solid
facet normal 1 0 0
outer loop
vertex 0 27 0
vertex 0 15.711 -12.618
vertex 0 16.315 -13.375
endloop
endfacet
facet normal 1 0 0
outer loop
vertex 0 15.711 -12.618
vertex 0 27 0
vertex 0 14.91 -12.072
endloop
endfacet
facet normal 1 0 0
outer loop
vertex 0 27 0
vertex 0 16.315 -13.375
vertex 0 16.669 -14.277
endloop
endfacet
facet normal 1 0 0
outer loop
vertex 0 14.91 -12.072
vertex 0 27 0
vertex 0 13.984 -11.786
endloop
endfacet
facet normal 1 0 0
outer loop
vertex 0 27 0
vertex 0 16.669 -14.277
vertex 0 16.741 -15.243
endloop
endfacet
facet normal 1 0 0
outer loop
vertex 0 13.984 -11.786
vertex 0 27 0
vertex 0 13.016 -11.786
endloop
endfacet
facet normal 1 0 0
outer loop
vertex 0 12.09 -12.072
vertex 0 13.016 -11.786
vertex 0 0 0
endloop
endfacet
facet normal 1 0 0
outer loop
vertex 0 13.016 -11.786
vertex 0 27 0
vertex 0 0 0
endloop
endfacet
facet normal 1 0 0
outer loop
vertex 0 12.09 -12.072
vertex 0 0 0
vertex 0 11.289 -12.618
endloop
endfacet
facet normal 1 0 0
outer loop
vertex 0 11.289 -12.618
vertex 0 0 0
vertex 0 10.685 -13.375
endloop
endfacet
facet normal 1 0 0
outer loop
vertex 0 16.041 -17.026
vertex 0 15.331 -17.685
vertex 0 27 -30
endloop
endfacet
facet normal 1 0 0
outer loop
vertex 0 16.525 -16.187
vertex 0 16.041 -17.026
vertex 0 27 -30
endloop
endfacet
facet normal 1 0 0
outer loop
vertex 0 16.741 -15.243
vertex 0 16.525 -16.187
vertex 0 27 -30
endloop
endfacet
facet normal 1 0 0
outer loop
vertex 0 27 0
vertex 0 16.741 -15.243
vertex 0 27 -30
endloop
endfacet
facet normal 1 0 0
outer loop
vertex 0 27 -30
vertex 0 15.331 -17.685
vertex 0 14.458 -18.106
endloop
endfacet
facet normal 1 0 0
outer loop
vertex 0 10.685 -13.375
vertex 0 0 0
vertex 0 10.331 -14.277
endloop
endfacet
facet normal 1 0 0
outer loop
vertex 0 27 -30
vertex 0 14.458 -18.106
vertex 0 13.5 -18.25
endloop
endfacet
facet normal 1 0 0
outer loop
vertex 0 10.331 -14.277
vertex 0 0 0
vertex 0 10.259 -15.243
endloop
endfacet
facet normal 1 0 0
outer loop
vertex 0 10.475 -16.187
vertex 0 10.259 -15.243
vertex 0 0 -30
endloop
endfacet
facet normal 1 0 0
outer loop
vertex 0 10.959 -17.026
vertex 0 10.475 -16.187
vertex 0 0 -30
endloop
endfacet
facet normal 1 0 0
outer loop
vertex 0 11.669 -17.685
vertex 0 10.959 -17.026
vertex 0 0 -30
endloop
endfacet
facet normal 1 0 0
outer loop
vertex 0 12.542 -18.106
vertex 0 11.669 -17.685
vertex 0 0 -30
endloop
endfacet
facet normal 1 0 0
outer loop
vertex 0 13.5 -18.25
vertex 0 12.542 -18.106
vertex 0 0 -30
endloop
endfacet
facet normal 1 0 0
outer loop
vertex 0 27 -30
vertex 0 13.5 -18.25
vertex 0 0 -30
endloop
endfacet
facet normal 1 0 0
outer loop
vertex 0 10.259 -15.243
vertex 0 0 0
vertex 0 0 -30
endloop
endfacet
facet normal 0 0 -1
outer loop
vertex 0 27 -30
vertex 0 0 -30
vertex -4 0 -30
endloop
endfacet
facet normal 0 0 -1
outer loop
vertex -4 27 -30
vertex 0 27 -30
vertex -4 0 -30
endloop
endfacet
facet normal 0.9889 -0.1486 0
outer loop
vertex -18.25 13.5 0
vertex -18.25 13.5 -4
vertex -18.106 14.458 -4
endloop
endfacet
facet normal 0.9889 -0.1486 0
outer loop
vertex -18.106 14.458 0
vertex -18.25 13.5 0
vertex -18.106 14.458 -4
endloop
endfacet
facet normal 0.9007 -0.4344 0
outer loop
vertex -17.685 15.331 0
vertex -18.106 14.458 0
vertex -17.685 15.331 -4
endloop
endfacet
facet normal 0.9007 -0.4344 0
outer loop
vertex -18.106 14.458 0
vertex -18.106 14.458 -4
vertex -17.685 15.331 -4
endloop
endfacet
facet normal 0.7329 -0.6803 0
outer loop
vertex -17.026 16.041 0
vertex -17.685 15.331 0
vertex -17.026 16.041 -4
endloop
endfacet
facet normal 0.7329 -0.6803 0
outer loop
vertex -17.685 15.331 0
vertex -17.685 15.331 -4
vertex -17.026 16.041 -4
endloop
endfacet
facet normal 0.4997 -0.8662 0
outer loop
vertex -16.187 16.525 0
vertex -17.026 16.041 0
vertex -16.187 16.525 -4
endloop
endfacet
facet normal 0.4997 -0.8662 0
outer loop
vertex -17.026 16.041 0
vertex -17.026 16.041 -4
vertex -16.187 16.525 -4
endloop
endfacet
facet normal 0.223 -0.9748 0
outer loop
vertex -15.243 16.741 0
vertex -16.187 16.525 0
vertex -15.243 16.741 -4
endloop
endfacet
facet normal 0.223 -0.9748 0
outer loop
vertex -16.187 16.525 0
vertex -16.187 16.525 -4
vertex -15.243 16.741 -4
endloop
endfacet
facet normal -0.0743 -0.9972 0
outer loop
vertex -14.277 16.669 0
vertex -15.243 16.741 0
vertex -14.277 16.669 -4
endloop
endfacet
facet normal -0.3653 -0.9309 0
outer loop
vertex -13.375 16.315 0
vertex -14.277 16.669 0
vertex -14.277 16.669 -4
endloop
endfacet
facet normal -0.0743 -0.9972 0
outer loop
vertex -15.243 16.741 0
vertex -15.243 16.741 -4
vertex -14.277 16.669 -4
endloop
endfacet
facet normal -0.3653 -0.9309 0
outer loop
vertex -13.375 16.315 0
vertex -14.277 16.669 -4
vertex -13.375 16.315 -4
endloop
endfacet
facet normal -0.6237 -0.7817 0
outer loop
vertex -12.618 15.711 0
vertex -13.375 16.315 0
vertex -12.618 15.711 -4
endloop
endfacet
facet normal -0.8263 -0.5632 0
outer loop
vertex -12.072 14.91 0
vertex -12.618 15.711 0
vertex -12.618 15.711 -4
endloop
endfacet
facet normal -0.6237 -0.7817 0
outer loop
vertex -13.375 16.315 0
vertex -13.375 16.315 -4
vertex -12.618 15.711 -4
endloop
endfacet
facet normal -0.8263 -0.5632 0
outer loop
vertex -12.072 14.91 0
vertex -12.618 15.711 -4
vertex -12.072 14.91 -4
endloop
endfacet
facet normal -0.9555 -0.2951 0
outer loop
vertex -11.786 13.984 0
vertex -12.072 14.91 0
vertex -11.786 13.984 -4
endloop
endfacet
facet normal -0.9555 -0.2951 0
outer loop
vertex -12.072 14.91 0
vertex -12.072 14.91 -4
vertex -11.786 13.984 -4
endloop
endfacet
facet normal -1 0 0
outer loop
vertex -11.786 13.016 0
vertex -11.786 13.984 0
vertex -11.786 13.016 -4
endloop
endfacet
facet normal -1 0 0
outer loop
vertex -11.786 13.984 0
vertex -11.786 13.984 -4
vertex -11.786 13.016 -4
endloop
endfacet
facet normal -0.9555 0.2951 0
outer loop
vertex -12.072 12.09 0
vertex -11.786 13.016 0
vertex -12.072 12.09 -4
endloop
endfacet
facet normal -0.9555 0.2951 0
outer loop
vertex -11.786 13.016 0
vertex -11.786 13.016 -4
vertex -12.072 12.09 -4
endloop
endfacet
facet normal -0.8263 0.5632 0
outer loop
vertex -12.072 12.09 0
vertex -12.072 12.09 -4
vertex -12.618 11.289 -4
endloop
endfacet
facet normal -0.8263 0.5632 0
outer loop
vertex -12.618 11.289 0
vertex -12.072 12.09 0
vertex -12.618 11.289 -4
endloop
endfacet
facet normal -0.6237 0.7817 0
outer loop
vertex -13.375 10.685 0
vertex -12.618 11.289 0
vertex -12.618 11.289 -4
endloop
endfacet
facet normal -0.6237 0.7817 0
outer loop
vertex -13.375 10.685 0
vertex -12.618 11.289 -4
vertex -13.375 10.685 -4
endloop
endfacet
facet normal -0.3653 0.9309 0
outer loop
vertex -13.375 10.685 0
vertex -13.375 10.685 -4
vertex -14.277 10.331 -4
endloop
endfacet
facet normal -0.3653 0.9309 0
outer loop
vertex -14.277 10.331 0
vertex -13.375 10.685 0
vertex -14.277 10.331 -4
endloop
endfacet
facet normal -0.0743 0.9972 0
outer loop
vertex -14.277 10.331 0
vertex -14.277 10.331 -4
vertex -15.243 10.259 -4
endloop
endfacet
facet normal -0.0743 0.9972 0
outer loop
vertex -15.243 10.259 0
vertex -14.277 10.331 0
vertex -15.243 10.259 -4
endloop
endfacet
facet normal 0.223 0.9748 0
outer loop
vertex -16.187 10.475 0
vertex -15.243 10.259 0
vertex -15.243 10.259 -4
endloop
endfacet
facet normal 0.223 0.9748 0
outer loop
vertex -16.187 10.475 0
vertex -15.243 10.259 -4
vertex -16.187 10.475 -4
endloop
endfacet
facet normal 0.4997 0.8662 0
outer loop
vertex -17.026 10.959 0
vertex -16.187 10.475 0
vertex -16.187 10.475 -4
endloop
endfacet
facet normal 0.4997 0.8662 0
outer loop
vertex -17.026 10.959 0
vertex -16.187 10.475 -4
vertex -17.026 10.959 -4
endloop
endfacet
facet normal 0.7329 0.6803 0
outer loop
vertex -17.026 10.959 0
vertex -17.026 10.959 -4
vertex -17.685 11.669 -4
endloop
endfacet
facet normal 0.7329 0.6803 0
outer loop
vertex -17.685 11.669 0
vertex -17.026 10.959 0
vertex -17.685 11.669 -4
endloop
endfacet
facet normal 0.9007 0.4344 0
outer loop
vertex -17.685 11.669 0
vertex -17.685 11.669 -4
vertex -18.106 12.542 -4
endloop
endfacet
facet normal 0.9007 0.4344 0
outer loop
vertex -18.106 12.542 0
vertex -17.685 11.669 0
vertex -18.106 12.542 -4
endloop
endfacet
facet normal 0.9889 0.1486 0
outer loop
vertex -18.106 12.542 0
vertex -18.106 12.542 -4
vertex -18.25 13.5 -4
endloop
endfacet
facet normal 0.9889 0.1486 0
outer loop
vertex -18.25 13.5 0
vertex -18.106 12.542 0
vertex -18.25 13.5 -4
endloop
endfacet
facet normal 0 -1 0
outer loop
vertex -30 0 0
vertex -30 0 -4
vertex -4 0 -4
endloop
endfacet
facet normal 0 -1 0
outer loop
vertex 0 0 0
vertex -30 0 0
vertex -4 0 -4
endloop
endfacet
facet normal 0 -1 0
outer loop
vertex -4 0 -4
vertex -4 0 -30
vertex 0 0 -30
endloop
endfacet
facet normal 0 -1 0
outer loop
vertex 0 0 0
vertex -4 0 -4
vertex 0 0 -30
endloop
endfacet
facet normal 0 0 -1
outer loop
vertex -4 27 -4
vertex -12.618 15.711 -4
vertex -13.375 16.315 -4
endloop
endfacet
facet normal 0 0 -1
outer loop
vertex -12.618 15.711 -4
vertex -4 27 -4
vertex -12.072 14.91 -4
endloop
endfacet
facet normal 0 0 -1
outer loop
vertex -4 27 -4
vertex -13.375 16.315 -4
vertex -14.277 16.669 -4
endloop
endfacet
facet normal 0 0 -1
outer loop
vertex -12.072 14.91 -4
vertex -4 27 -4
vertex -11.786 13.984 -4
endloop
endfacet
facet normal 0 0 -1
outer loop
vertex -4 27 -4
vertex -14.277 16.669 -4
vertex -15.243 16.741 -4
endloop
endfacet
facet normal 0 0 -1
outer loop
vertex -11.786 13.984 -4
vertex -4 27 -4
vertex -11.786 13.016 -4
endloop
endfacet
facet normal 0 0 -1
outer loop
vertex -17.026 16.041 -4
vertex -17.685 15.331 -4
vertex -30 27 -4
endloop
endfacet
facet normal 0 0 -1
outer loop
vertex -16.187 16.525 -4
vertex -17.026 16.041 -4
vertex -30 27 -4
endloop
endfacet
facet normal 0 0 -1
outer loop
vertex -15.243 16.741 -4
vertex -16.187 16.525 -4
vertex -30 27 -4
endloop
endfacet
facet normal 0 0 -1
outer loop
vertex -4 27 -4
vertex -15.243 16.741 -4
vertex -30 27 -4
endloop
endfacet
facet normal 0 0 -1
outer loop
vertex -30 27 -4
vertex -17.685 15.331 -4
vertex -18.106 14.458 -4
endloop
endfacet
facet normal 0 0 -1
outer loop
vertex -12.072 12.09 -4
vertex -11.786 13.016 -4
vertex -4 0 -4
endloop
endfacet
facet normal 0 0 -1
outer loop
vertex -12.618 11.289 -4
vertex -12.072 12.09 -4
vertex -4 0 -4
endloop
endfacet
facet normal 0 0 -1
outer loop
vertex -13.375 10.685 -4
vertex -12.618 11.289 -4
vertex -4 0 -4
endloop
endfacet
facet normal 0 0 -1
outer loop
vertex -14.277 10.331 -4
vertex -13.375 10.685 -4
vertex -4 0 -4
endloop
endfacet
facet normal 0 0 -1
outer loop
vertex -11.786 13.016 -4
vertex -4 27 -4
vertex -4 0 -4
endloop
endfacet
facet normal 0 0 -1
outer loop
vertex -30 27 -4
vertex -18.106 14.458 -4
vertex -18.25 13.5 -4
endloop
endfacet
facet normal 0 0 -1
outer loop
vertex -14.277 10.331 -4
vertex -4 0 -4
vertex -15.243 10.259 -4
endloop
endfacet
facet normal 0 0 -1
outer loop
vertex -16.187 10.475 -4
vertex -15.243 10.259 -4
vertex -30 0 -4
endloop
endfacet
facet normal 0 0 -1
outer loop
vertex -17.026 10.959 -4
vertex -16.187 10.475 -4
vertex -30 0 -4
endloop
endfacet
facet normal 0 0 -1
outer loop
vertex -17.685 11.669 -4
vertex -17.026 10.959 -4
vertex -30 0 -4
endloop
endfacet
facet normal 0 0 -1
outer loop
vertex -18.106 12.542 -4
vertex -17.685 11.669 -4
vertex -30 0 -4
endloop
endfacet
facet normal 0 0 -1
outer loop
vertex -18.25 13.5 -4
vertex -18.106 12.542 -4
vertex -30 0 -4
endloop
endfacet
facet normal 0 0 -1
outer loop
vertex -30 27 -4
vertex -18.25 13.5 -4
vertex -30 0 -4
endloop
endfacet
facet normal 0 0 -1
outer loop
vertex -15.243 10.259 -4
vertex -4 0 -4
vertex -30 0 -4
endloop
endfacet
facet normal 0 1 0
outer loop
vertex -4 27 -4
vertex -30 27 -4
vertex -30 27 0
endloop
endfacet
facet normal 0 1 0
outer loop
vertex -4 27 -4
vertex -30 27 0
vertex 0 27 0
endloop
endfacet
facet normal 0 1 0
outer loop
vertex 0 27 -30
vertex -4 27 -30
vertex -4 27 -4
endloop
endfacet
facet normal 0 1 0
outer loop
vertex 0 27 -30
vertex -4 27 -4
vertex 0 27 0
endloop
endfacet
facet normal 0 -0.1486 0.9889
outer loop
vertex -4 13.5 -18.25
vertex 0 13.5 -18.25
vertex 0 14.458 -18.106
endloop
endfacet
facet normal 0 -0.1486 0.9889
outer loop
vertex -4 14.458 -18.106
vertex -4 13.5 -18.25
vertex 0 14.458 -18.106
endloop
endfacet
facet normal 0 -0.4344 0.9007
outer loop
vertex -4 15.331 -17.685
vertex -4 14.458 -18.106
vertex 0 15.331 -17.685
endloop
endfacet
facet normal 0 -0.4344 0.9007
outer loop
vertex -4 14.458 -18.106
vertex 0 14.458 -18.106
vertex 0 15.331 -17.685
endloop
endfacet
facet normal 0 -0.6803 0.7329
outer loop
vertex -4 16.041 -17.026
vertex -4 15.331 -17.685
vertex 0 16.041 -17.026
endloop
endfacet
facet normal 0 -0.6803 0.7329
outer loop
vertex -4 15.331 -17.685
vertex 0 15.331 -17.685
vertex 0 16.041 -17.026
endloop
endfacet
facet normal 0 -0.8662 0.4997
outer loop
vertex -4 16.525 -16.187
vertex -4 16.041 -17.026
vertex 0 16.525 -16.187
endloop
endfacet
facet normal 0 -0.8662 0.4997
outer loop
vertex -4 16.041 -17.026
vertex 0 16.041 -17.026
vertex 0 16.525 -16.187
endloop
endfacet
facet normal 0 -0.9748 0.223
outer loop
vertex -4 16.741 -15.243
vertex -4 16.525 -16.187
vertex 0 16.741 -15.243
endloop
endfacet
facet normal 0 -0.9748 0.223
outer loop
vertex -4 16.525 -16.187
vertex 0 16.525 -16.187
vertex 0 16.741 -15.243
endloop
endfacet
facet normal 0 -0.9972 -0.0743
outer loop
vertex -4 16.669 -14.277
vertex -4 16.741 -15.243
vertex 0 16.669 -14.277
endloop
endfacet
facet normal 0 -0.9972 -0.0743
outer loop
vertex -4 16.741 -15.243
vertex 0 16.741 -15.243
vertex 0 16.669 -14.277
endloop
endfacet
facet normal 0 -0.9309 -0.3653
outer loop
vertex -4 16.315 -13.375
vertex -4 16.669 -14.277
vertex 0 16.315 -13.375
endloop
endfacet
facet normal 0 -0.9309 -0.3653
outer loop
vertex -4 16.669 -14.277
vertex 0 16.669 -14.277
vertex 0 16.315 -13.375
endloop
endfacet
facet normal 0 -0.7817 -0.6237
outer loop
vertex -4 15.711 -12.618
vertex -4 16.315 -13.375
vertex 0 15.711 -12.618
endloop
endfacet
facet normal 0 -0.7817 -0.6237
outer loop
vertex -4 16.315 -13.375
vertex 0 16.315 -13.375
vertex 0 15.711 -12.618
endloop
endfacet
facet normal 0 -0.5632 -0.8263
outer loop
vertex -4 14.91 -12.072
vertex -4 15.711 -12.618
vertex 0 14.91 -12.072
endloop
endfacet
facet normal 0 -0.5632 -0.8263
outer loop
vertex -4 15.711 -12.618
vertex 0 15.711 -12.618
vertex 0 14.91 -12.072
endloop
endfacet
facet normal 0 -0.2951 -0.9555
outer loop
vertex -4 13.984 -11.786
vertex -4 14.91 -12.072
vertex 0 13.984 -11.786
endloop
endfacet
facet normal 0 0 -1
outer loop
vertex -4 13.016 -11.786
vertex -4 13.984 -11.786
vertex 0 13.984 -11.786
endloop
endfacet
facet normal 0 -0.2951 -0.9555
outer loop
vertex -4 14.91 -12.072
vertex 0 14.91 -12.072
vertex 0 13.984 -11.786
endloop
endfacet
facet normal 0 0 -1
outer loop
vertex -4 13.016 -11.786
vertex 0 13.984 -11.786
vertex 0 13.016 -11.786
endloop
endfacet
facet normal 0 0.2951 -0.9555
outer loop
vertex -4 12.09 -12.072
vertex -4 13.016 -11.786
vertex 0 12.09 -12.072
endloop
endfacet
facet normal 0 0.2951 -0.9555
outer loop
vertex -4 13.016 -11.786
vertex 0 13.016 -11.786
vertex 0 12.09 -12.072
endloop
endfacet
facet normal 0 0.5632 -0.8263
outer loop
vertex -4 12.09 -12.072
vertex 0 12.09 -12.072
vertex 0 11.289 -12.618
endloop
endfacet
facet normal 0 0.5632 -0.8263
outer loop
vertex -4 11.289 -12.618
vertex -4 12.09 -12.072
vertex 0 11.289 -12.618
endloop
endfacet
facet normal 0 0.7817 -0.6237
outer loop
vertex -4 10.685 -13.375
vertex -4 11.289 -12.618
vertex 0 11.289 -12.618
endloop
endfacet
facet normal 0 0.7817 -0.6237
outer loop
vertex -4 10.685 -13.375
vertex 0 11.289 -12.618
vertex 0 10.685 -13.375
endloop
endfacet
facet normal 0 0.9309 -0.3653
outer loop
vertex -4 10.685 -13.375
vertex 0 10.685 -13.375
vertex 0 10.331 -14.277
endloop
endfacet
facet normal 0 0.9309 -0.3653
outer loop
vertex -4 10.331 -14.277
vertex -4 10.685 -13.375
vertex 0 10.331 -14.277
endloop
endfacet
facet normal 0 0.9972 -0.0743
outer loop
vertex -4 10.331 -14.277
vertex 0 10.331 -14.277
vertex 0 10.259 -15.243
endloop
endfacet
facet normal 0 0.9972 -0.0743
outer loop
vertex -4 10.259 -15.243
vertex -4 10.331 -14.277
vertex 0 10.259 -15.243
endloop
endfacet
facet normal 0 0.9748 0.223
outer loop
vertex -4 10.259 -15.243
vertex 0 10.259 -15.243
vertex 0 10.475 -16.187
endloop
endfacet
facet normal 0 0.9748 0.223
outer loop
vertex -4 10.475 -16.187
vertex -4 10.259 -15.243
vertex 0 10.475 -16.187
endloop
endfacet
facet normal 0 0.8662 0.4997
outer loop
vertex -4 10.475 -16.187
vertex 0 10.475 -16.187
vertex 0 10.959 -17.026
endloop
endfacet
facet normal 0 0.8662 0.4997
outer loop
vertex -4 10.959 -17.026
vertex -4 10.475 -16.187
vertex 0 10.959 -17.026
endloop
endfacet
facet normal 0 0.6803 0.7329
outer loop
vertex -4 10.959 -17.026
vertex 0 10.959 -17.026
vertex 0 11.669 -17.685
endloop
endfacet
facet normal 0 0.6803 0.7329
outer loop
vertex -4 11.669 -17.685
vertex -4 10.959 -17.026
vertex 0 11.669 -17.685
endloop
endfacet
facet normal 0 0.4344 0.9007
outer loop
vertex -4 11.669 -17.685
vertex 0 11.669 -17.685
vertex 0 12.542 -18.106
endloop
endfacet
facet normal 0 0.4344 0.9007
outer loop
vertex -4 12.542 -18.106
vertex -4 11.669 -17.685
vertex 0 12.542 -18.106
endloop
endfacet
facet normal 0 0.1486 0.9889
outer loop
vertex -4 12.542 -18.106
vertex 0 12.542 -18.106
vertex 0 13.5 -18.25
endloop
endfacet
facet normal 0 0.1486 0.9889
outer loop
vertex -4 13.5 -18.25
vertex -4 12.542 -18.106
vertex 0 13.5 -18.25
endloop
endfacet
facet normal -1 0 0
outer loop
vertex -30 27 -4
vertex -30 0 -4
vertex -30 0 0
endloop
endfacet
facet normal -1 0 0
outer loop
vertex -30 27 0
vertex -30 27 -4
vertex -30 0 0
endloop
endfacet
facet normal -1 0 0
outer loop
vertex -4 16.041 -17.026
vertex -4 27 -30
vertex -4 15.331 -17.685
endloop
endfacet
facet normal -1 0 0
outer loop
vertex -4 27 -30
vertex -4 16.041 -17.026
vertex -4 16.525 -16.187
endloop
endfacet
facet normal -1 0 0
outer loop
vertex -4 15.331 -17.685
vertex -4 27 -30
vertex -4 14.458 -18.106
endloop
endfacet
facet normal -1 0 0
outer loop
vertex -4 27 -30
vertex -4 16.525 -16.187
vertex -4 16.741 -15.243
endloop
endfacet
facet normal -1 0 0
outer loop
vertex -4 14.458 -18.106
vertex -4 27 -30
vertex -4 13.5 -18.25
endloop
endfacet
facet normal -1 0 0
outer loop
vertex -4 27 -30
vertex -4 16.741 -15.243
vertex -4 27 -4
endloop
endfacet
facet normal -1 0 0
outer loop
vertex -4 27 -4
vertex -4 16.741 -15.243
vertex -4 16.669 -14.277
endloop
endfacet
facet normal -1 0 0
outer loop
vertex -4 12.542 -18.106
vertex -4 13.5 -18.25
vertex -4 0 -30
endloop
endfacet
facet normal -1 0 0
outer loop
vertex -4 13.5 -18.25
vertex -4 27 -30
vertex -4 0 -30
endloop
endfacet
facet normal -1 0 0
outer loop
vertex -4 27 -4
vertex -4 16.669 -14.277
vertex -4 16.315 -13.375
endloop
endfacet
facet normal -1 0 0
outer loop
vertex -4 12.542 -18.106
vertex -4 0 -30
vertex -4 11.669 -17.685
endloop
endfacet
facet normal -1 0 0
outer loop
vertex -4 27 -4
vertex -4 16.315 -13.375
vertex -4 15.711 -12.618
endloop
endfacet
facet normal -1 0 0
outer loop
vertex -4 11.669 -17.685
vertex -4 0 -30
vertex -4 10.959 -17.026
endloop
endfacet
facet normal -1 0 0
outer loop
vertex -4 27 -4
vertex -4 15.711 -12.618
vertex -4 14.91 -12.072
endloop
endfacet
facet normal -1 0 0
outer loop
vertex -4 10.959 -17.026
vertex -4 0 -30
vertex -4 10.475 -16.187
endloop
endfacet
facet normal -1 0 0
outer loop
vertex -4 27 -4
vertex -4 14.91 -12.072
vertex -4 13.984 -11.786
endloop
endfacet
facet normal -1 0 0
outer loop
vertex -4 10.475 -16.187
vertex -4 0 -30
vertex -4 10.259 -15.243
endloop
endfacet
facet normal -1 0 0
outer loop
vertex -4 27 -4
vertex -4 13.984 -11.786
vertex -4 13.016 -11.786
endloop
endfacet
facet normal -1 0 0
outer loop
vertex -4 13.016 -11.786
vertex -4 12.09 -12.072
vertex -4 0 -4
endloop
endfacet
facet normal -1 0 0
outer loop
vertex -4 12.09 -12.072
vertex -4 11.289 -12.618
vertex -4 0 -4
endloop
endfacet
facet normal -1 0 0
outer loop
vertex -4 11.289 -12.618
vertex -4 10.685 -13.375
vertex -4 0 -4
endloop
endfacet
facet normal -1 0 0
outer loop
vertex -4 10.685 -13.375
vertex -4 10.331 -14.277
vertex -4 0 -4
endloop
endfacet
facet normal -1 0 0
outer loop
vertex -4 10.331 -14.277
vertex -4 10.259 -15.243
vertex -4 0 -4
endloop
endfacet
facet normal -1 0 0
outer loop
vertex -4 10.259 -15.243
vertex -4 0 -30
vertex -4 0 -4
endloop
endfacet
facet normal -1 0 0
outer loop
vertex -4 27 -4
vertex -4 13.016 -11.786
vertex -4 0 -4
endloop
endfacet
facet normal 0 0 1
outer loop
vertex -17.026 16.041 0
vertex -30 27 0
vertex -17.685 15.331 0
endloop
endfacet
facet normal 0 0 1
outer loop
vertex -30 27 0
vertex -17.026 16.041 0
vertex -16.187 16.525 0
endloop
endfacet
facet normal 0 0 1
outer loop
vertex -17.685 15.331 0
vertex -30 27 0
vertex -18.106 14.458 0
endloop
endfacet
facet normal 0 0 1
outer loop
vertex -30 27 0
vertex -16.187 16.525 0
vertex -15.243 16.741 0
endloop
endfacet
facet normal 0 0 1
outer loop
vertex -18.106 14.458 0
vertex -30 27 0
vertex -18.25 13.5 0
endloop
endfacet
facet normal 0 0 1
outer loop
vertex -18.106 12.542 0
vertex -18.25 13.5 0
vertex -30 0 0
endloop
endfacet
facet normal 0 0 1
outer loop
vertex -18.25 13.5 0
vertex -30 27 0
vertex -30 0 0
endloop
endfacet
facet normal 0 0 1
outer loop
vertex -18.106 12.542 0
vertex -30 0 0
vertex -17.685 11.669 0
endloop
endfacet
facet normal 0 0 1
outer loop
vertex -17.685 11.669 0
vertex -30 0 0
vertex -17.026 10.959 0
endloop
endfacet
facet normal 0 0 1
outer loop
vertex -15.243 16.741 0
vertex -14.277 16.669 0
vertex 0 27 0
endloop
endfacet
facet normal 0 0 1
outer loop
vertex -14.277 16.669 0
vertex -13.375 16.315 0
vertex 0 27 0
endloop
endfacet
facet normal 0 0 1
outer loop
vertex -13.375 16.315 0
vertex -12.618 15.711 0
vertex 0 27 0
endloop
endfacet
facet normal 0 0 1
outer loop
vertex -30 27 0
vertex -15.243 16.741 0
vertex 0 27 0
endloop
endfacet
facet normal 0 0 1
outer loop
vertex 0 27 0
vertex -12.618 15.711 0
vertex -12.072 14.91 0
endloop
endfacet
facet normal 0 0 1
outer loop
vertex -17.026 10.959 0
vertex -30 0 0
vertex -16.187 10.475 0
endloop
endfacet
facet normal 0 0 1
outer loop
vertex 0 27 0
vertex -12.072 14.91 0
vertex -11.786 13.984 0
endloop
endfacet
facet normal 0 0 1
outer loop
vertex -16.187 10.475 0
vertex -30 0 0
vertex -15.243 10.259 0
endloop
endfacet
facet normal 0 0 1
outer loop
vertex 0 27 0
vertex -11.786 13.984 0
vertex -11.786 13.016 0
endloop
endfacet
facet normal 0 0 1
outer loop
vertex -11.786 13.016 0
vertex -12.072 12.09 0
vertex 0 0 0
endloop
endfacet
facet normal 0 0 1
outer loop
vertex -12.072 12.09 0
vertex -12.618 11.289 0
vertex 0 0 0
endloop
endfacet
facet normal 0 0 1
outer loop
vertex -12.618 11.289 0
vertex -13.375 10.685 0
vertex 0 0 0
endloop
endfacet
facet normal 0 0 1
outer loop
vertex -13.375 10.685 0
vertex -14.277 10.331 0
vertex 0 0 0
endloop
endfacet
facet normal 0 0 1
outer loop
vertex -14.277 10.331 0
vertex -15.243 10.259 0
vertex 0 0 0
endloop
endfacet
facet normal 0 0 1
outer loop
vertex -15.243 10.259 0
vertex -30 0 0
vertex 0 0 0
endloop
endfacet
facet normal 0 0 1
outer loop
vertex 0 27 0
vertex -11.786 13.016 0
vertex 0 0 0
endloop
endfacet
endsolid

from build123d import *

# Parameters (mm, degrees)
EXTRUDE_1_DEPTH     = 27
SKETCH_2_R          = 3.25
CUT_EXTRUDE_1_DEPTH = 27
SKETCH_3_R          = 3.25
CUT_EXTRUDE_2_DEPTH = 27


with BuildPart() as part:
    # 草图1 → 凸台-拉伸1 (new body)
    with BuildSketch(Plane(origin=(0, 0, 0), x_dir=(1, 0, 0), z_dir=(0, 1, 0))):
        Polygon((0, 0), (0, 30), (-4, 30), (-4, 4), (-30, 4), (-30, 0), align=None)
    extrude(amount=EXTRUDE_1_DEPTH)

    # 草图2 → 切除-拉伸1 (cut)
    with BuildSketch(Plane(origin=(0, 0, -4), x_dir=(-1, 0, 0), z_dir=(0, 0, -1))):
        with Locations((15, 13.5)):
            Circle(SKETCH_2_R)
    extrude(amount=-CUT_EXTRUDE_1_DEPTH, mode=Mode.SUBTRACT)

    # 草图3 → 切除-拉伸2 (cut)
    with BuildSketch(Plane(origin=(0, 0, 0), x_dir=(0, 0, -1), z_dir=(1, 0, 0))):
        with Locations((15, 13.5)):
            Circle(SKETCH_3_R)
    extrude(amount=-CUT_EXTRUDE_2_DEPTH, mode=Mode.SUBTRACT)


solid = part.part
